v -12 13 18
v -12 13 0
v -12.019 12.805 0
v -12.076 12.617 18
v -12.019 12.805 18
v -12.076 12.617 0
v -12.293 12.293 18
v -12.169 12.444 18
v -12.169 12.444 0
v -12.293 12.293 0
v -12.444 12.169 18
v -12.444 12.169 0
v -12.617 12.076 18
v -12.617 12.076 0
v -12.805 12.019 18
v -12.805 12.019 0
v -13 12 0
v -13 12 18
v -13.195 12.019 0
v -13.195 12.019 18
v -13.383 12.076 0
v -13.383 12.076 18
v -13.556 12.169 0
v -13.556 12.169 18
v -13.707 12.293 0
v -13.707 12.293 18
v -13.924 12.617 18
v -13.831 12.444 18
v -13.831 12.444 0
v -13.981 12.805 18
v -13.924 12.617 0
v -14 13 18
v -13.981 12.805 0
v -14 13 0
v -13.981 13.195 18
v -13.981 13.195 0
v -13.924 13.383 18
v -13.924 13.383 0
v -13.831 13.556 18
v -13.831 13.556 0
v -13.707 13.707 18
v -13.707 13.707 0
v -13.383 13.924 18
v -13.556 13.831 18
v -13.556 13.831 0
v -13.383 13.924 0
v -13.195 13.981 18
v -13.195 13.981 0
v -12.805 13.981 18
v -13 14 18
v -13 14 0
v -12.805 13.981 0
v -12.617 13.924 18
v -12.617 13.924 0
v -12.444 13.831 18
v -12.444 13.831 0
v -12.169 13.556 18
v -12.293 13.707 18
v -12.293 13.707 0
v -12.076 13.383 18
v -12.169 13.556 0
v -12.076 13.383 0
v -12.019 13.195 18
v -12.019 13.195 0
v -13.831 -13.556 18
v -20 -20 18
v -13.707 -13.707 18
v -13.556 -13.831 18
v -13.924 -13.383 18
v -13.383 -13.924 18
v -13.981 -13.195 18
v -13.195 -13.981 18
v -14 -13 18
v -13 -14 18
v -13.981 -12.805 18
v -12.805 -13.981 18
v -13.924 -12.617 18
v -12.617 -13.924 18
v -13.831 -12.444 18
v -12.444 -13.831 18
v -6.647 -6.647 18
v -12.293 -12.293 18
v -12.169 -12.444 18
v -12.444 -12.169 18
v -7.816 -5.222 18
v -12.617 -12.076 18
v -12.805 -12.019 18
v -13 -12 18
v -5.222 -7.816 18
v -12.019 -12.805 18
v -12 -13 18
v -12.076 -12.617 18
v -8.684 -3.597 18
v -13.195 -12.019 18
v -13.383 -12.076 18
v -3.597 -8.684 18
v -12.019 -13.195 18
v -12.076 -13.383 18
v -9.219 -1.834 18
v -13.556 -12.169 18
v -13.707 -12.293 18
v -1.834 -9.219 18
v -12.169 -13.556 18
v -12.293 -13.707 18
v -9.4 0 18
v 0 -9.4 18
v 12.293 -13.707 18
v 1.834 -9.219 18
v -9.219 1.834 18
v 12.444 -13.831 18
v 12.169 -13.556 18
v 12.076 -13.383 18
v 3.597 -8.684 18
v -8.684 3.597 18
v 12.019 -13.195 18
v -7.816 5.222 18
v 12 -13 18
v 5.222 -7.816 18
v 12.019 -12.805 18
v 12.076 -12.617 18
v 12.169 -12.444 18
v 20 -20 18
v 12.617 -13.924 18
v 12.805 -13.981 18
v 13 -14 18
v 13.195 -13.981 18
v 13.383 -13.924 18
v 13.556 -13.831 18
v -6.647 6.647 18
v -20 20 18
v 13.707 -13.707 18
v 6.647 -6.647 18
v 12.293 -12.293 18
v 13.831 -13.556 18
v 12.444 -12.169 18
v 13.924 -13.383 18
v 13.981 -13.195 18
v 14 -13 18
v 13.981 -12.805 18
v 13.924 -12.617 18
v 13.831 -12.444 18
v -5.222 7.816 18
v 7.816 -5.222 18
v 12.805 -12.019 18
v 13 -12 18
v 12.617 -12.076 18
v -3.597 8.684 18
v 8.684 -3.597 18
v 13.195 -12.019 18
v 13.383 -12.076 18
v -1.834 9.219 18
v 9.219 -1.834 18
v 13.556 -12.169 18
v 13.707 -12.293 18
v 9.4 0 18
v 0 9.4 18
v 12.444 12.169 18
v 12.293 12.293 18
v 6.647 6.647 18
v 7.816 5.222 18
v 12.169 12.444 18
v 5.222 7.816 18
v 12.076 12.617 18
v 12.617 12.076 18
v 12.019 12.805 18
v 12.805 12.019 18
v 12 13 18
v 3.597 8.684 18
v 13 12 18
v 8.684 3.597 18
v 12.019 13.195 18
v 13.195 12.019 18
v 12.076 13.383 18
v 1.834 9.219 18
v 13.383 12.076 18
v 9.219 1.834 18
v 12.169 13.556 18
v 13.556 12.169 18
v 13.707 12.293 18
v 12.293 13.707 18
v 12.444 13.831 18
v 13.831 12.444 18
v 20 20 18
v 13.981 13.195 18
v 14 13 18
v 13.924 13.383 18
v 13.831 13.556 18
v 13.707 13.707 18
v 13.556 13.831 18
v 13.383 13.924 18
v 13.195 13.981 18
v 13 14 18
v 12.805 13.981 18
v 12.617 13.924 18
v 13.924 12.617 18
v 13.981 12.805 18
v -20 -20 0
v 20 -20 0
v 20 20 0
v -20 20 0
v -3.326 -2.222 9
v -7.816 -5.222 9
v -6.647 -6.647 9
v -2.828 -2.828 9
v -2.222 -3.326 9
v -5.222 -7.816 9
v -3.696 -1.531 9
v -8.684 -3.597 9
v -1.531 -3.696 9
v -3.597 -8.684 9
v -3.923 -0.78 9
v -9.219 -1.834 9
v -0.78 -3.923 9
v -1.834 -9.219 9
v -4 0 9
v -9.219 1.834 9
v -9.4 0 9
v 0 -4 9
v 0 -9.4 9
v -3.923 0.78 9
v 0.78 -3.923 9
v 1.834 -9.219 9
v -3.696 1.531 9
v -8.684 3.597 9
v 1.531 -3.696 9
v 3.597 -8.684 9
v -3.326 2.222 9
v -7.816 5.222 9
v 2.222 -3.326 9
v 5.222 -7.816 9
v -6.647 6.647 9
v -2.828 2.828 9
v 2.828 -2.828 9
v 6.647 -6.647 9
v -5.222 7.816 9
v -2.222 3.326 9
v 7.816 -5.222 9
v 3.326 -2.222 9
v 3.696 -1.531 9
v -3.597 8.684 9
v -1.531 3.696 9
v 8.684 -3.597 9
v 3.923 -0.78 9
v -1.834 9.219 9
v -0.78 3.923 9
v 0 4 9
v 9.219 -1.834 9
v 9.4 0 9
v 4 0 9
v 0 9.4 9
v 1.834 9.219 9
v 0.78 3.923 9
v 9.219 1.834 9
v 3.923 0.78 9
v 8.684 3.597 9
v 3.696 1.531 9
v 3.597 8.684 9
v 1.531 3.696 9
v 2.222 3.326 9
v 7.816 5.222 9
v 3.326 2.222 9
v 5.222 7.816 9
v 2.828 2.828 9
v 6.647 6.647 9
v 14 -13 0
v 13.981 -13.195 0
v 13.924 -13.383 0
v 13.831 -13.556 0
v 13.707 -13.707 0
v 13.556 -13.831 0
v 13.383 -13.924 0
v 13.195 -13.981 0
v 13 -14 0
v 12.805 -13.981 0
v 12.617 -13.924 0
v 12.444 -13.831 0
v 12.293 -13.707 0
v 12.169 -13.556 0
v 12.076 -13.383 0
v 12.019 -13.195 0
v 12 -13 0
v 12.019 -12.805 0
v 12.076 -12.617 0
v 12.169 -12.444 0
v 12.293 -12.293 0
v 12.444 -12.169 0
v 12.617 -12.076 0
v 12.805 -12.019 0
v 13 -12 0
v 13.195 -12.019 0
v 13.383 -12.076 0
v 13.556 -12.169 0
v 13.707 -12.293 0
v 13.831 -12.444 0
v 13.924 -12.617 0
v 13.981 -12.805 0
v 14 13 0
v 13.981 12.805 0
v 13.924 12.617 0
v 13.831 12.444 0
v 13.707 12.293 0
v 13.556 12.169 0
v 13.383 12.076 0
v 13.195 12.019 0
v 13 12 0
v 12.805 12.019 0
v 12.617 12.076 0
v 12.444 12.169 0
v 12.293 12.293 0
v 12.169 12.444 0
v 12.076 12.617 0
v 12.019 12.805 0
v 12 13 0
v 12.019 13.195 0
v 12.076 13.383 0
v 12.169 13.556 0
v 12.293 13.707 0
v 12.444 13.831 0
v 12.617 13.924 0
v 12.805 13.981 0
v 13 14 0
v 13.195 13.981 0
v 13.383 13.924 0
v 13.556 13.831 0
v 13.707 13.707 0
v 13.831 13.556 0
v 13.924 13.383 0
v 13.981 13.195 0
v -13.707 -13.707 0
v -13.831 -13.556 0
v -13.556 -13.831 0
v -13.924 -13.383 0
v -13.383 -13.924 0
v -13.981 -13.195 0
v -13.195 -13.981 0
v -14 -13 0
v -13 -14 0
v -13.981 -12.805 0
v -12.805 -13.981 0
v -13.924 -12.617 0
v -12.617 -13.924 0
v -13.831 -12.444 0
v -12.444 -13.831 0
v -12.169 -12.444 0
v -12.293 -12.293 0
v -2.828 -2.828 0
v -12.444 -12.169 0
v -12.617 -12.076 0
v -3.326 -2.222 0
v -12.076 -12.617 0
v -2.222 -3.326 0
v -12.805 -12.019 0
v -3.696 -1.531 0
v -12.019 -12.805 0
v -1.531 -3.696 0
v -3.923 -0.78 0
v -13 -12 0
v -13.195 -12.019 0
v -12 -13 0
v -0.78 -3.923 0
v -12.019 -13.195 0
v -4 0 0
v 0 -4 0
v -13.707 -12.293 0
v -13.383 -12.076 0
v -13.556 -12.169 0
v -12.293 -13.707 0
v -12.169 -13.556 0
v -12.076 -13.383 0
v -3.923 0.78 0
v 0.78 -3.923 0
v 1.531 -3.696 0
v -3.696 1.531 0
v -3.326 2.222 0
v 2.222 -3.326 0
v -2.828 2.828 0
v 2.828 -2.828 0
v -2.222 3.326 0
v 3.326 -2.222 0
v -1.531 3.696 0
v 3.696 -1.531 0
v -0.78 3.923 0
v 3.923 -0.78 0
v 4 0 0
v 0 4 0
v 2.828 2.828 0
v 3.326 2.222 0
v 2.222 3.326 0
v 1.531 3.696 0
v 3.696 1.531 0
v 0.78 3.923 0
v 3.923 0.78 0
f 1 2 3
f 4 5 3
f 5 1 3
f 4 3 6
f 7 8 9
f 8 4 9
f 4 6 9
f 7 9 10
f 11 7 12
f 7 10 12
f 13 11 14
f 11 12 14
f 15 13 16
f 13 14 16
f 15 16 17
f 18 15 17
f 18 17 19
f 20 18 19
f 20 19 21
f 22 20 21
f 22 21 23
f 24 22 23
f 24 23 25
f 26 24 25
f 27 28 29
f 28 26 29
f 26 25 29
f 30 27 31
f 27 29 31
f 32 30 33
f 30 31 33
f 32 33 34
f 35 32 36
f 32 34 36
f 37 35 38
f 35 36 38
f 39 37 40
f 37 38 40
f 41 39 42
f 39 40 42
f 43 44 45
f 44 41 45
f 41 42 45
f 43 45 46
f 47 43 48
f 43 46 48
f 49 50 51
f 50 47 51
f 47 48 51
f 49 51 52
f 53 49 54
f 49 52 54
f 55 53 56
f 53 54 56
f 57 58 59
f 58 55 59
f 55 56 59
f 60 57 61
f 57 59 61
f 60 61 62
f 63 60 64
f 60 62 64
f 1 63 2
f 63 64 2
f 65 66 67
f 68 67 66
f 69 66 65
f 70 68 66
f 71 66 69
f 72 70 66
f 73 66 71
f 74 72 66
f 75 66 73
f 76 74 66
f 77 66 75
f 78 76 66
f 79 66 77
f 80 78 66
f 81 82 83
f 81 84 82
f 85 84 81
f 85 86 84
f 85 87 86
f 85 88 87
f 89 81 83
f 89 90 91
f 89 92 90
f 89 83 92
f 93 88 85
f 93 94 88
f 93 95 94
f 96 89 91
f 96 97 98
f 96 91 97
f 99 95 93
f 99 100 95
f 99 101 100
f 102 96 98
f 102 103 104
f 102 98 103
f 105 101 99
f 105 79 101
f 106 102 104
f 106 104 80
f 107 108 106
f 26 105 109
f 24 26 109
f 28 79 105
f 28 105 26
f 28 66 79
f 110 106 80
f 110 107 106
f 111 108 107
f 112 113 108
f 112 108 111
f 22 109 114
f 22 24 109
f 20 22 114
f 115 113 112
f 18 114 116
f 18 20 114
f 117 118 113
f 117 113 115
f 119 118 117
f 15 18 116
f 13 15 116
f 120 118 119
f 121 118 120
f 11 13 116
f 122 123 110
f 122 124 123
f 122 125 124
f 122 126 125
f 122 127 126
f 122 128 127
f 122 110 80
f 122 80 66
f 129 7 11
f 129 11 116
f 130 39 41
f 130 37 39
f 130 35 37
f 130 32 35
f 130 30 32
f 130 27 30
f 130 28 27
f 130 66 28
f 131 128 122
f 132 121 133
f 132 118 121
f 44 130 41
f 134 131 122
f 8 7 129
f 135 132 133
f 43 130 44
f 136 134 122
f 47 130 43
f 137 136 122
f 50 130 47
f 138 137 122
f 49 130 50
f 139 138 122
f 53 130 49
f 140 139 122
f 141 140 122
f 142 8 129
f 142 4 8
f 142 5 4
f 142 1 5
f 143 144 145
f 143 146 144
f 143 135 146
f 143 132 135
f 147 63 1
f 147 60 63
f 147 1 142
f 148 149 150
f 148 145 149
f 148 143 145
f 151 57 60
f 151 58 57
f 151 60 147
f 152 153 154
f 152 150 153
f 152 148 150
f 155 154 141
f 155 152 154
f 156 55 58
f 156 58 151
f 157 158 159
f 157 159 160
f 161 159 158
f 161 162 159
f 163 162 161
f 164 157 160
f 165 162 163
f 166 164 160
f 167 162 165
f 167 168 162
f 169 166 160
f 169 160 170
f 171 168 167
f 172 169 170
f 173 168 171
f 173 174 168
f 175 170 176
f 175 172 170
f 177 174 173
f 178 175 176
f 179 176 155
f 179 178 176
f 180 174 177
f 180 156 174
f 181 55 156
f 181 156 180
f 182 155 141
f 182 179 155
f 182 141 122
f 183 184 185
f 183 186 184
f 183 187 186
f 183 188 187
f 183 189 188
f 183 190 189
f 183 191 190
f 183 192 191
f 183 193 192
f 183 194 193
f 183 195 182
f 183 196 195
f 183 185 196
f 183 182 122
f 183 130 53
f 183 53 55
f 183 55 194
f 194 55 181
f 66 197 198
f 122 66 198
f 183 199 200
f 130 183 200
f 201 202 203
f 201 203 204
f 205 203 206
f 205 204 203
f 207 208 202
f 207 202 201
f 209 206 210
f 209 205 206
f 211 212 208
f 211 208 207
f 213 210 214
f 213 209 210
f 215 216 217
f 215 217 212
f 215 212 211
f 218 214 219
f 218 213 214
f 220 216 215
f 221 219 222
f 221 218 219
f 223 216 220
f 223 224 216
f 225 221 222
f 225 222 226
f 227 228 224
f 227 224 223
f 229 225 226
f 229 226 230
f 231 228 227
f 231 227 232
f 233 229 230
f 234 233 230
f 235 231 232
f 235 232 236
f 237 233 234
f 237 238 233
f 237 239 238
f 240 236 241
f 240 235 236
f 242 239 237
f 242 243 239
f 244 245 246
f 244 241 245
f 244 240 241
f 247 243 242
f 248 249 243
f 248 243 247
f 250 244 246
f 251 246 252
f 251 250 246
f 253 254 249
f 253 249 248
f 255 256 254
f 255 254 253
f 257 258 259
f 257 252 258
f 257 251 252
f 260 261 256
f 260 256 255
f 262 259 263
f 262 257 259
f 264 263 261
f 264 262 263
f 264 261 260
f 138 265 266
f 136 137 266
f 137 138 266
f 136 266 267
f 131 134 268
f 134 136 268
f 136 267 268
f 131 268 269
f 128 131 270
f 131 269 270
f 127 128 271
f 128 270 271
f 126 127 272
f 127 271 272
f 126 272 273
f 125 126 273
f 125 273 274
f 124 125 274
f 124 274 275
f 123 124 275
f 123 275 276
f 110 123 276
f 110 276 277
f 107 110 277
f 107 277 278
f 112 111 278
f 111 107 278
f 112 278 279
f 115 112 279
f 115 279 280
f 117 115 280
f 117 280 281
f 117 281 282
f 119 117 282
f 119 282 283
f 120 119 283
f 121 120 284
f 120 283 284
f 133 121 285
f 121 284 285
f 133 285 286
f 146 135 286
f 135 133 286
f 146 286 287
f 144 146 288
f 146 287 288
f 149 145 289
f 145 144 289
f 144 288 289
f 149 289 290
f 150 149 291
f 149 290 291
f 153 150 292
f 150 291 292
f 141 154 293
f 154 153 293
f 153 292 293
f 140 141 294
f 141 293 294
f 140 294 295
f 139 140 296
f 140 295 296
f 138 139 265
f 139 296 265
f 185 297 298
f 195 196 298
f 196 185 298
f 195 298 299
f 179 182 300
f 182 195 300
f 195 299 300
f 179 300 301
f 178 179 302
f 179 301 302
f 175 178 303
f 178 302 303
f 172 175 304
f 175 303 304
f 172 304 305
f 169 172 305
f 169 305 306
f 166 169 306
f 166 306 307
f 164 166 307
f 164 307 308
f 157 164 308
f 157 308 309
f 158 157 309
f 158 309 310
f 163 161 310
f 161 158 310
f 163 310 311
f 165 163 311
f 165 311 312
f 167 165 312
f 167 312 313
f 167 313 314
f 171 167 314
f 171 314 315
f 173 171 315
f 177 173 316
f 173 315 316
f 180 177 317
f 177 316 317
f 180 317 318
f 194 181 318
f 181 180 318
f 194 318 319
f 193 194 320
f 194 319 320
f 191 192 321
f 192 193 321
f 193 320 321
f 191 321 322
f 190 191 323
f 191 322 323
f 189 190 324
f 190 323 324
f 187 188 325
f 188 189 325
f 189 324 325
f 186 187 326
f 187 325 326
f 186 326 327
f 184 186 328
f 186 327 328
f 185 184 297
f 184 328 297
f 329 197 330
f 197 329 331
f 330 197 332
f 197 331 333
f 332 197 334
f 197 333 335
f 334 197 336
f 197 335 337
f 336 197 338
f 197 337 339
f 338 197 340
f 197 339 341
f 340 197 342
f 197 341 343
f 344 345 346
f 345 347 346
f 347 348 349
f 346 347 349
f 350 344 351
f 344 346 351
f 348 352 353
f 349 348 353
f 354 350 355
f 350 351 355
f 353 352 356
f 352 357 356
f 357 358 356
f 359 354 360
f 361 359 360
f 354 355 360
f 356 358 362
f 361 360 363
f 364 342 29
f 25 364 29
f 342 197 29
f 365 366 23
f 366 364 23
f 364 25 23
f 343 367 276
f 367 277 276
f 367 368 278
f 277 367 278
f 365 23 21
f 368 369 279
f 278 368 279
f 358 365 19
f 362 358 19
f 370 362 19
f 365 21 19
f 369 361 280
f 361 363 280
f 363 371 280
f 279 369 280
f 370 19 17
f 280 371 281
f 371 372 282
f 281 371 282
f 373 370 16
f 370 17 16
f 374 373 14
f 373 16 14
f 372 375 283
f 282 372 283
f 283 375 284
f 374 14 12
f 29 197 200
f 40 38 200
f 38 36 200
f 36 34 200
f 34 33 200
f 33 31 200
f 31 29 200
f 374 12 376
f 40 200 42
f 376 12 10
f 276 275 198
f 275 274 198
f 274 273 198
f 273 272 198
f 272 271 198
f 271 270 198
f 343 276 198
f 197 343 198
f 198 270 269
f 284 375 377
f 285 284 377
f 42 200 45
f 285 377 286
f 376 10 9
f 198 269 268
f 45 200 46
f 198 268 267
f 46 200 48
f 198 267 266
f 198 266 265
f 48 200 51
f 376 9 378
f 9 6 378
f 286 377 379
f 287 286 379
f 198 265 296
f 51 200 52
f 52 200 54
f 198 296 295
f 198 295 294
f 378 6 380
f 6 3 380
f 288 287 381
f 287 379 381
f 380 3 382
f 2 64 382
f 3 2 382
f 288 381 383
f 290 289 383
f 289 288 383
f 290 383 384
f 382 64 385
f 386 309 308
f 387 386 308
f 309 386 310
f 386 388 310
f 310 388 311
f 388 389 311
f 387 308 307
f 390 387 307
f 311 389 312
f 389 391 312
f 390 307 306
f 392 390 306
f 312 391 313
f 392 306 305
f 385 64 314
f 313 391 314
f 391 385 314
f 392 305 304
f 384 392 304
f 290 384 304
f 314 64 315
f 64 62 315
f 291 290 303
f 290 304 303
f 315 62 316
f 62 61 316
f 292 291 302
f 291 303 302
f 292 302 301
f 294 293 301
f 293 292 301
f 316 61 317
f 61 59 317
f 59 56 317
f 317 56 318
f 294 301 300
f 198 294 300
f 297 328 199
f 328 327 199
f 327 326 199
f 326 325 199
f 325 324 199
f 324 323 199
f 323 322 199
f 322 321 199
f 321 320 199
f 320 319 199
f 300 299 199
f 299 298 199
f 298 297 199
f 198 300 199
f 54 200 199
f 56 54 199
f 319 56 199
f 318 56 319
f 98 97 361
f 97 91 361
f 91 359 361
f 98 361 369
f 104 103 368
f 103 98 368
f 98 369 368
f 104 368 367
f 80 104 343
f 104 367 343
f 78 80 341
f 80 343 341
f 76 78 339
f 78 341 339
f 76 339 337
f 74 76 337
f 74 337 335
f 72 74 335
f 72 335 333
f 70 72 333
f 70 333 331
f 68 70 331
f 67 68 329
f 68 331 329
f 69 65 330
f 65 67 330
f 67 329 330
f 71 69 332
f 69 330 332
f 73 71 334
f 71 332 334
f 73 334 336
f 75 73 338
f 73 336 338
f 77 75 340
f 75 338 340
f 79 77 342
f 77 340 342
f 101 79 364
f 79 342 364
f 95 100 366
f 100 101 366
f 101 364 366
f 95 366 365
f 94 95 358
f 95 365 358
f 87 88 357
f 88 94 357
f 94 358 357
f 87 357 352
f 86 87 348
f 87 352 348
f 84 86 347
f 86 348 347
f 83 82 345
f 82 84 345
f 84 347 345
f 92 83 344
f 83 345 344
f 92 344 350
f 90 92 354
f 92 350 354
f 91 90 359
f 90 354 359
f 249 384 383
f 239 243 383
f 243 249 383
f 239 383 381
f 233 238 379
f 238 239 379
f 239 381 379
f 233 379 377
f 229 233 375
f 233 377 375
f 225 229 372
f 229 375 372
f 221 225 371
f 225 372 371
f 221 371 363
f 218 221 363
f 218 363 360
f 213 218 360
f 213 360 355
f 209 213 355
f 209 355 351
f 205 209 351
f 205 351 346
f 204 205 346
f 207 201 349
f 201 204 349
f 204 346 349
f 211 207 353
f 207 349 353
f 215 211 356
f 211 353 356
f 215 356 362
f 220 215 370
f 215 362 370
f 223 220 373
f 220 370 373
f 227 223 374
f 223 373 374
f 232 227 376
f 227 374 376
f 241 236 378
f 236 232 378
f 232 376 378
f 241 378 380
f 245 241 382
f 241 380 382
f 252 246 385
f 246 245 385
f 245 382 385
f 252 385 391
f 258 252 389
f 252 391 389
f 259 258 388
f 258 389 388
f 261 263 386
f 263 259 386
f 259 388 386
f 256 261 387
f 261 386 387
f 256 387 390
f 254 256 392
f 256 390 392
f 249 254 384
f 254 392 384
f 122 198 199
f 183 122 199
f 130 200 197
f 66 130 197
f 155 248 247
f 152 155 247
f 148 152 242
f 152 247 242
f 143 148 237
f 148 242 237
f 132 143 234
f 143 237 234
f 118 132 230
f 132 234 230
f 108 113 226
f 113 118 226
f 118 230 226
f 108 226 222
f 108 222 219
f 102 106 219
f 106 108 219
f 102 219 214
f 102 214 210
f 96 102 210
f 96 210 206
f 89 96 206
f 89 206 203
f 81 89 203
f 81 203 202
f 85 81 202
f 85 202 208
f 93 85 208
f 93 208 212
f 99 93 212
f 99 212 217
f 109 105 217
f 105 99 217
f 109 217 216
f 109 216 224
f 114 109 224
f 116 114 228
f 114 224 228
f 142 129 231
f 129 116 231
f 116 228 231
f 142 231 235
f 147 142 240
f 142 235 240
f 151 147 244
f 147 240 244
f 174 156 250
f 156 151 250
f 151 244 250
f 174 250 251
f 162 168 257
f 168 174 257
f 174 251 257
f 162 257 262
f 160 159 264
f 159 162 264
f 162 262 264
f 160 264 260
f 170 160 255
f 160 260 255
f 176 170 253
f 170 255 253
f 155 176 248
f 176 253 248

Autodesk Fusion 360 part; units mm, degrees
sketch "Sketch1" plane through (0, 0, 0) normal (0, 0, 1) x (1, 0, 0)
  line L0 (20, 20) -> (-20, 20)
  line L1 (-20, 20) -> (-20, -20)
  line L2 (-20, -20) -> (20, -20)
  line L3 (20, -20) -> (20, 20)
  line L4 (20, 20) -> (-20, -20) construction
  line L5 (-20, 20) -> (20, -20) construction
  circle A0 centre (0, 0) radius 4
  circle A1 centre (0, 0) radius 9.4
  line L6 (13, -13) -> (-13, -13) construction
  line L7 (-13, -13) -> (-13, 13) construction
  line L8 (-13, 13) -> (13, 13) construction
  line L9 (13, 13) -> (13, -13) construction
  line L10 (13, -13) -> (-13, 13) construction
  line L11 (-13, -13) -> (13, 13) construction
  circle A2 centre (-13, 13) radius 1
  circle A3 centre (13, 13) radius 1
  circle A4 centre (13, -13) radius 1
  circle A5 centre (-13, -13) radius 1
  dimension "d1" = 40
  dimension "d2" = 40
  dimension "d3" = 8
  dimension "d4" = 18.8
  dimension "d9" = 26
  dimension "d10" = 26
  dimension "d11" = 2
  dimension "d12" = 2
  dimension "d13" = 2
  dimension "d14" = 2
extrude "Extrude1" add sketch "Sketch1" along normal blind 9 contours A1
extrude "Extrude2" add sketch "Sketch1" along normal blind 18 contours L0 L1 L2 L3
equation "d12 = d11"
equation "d13 = d11"
equation "d14 = d11"
